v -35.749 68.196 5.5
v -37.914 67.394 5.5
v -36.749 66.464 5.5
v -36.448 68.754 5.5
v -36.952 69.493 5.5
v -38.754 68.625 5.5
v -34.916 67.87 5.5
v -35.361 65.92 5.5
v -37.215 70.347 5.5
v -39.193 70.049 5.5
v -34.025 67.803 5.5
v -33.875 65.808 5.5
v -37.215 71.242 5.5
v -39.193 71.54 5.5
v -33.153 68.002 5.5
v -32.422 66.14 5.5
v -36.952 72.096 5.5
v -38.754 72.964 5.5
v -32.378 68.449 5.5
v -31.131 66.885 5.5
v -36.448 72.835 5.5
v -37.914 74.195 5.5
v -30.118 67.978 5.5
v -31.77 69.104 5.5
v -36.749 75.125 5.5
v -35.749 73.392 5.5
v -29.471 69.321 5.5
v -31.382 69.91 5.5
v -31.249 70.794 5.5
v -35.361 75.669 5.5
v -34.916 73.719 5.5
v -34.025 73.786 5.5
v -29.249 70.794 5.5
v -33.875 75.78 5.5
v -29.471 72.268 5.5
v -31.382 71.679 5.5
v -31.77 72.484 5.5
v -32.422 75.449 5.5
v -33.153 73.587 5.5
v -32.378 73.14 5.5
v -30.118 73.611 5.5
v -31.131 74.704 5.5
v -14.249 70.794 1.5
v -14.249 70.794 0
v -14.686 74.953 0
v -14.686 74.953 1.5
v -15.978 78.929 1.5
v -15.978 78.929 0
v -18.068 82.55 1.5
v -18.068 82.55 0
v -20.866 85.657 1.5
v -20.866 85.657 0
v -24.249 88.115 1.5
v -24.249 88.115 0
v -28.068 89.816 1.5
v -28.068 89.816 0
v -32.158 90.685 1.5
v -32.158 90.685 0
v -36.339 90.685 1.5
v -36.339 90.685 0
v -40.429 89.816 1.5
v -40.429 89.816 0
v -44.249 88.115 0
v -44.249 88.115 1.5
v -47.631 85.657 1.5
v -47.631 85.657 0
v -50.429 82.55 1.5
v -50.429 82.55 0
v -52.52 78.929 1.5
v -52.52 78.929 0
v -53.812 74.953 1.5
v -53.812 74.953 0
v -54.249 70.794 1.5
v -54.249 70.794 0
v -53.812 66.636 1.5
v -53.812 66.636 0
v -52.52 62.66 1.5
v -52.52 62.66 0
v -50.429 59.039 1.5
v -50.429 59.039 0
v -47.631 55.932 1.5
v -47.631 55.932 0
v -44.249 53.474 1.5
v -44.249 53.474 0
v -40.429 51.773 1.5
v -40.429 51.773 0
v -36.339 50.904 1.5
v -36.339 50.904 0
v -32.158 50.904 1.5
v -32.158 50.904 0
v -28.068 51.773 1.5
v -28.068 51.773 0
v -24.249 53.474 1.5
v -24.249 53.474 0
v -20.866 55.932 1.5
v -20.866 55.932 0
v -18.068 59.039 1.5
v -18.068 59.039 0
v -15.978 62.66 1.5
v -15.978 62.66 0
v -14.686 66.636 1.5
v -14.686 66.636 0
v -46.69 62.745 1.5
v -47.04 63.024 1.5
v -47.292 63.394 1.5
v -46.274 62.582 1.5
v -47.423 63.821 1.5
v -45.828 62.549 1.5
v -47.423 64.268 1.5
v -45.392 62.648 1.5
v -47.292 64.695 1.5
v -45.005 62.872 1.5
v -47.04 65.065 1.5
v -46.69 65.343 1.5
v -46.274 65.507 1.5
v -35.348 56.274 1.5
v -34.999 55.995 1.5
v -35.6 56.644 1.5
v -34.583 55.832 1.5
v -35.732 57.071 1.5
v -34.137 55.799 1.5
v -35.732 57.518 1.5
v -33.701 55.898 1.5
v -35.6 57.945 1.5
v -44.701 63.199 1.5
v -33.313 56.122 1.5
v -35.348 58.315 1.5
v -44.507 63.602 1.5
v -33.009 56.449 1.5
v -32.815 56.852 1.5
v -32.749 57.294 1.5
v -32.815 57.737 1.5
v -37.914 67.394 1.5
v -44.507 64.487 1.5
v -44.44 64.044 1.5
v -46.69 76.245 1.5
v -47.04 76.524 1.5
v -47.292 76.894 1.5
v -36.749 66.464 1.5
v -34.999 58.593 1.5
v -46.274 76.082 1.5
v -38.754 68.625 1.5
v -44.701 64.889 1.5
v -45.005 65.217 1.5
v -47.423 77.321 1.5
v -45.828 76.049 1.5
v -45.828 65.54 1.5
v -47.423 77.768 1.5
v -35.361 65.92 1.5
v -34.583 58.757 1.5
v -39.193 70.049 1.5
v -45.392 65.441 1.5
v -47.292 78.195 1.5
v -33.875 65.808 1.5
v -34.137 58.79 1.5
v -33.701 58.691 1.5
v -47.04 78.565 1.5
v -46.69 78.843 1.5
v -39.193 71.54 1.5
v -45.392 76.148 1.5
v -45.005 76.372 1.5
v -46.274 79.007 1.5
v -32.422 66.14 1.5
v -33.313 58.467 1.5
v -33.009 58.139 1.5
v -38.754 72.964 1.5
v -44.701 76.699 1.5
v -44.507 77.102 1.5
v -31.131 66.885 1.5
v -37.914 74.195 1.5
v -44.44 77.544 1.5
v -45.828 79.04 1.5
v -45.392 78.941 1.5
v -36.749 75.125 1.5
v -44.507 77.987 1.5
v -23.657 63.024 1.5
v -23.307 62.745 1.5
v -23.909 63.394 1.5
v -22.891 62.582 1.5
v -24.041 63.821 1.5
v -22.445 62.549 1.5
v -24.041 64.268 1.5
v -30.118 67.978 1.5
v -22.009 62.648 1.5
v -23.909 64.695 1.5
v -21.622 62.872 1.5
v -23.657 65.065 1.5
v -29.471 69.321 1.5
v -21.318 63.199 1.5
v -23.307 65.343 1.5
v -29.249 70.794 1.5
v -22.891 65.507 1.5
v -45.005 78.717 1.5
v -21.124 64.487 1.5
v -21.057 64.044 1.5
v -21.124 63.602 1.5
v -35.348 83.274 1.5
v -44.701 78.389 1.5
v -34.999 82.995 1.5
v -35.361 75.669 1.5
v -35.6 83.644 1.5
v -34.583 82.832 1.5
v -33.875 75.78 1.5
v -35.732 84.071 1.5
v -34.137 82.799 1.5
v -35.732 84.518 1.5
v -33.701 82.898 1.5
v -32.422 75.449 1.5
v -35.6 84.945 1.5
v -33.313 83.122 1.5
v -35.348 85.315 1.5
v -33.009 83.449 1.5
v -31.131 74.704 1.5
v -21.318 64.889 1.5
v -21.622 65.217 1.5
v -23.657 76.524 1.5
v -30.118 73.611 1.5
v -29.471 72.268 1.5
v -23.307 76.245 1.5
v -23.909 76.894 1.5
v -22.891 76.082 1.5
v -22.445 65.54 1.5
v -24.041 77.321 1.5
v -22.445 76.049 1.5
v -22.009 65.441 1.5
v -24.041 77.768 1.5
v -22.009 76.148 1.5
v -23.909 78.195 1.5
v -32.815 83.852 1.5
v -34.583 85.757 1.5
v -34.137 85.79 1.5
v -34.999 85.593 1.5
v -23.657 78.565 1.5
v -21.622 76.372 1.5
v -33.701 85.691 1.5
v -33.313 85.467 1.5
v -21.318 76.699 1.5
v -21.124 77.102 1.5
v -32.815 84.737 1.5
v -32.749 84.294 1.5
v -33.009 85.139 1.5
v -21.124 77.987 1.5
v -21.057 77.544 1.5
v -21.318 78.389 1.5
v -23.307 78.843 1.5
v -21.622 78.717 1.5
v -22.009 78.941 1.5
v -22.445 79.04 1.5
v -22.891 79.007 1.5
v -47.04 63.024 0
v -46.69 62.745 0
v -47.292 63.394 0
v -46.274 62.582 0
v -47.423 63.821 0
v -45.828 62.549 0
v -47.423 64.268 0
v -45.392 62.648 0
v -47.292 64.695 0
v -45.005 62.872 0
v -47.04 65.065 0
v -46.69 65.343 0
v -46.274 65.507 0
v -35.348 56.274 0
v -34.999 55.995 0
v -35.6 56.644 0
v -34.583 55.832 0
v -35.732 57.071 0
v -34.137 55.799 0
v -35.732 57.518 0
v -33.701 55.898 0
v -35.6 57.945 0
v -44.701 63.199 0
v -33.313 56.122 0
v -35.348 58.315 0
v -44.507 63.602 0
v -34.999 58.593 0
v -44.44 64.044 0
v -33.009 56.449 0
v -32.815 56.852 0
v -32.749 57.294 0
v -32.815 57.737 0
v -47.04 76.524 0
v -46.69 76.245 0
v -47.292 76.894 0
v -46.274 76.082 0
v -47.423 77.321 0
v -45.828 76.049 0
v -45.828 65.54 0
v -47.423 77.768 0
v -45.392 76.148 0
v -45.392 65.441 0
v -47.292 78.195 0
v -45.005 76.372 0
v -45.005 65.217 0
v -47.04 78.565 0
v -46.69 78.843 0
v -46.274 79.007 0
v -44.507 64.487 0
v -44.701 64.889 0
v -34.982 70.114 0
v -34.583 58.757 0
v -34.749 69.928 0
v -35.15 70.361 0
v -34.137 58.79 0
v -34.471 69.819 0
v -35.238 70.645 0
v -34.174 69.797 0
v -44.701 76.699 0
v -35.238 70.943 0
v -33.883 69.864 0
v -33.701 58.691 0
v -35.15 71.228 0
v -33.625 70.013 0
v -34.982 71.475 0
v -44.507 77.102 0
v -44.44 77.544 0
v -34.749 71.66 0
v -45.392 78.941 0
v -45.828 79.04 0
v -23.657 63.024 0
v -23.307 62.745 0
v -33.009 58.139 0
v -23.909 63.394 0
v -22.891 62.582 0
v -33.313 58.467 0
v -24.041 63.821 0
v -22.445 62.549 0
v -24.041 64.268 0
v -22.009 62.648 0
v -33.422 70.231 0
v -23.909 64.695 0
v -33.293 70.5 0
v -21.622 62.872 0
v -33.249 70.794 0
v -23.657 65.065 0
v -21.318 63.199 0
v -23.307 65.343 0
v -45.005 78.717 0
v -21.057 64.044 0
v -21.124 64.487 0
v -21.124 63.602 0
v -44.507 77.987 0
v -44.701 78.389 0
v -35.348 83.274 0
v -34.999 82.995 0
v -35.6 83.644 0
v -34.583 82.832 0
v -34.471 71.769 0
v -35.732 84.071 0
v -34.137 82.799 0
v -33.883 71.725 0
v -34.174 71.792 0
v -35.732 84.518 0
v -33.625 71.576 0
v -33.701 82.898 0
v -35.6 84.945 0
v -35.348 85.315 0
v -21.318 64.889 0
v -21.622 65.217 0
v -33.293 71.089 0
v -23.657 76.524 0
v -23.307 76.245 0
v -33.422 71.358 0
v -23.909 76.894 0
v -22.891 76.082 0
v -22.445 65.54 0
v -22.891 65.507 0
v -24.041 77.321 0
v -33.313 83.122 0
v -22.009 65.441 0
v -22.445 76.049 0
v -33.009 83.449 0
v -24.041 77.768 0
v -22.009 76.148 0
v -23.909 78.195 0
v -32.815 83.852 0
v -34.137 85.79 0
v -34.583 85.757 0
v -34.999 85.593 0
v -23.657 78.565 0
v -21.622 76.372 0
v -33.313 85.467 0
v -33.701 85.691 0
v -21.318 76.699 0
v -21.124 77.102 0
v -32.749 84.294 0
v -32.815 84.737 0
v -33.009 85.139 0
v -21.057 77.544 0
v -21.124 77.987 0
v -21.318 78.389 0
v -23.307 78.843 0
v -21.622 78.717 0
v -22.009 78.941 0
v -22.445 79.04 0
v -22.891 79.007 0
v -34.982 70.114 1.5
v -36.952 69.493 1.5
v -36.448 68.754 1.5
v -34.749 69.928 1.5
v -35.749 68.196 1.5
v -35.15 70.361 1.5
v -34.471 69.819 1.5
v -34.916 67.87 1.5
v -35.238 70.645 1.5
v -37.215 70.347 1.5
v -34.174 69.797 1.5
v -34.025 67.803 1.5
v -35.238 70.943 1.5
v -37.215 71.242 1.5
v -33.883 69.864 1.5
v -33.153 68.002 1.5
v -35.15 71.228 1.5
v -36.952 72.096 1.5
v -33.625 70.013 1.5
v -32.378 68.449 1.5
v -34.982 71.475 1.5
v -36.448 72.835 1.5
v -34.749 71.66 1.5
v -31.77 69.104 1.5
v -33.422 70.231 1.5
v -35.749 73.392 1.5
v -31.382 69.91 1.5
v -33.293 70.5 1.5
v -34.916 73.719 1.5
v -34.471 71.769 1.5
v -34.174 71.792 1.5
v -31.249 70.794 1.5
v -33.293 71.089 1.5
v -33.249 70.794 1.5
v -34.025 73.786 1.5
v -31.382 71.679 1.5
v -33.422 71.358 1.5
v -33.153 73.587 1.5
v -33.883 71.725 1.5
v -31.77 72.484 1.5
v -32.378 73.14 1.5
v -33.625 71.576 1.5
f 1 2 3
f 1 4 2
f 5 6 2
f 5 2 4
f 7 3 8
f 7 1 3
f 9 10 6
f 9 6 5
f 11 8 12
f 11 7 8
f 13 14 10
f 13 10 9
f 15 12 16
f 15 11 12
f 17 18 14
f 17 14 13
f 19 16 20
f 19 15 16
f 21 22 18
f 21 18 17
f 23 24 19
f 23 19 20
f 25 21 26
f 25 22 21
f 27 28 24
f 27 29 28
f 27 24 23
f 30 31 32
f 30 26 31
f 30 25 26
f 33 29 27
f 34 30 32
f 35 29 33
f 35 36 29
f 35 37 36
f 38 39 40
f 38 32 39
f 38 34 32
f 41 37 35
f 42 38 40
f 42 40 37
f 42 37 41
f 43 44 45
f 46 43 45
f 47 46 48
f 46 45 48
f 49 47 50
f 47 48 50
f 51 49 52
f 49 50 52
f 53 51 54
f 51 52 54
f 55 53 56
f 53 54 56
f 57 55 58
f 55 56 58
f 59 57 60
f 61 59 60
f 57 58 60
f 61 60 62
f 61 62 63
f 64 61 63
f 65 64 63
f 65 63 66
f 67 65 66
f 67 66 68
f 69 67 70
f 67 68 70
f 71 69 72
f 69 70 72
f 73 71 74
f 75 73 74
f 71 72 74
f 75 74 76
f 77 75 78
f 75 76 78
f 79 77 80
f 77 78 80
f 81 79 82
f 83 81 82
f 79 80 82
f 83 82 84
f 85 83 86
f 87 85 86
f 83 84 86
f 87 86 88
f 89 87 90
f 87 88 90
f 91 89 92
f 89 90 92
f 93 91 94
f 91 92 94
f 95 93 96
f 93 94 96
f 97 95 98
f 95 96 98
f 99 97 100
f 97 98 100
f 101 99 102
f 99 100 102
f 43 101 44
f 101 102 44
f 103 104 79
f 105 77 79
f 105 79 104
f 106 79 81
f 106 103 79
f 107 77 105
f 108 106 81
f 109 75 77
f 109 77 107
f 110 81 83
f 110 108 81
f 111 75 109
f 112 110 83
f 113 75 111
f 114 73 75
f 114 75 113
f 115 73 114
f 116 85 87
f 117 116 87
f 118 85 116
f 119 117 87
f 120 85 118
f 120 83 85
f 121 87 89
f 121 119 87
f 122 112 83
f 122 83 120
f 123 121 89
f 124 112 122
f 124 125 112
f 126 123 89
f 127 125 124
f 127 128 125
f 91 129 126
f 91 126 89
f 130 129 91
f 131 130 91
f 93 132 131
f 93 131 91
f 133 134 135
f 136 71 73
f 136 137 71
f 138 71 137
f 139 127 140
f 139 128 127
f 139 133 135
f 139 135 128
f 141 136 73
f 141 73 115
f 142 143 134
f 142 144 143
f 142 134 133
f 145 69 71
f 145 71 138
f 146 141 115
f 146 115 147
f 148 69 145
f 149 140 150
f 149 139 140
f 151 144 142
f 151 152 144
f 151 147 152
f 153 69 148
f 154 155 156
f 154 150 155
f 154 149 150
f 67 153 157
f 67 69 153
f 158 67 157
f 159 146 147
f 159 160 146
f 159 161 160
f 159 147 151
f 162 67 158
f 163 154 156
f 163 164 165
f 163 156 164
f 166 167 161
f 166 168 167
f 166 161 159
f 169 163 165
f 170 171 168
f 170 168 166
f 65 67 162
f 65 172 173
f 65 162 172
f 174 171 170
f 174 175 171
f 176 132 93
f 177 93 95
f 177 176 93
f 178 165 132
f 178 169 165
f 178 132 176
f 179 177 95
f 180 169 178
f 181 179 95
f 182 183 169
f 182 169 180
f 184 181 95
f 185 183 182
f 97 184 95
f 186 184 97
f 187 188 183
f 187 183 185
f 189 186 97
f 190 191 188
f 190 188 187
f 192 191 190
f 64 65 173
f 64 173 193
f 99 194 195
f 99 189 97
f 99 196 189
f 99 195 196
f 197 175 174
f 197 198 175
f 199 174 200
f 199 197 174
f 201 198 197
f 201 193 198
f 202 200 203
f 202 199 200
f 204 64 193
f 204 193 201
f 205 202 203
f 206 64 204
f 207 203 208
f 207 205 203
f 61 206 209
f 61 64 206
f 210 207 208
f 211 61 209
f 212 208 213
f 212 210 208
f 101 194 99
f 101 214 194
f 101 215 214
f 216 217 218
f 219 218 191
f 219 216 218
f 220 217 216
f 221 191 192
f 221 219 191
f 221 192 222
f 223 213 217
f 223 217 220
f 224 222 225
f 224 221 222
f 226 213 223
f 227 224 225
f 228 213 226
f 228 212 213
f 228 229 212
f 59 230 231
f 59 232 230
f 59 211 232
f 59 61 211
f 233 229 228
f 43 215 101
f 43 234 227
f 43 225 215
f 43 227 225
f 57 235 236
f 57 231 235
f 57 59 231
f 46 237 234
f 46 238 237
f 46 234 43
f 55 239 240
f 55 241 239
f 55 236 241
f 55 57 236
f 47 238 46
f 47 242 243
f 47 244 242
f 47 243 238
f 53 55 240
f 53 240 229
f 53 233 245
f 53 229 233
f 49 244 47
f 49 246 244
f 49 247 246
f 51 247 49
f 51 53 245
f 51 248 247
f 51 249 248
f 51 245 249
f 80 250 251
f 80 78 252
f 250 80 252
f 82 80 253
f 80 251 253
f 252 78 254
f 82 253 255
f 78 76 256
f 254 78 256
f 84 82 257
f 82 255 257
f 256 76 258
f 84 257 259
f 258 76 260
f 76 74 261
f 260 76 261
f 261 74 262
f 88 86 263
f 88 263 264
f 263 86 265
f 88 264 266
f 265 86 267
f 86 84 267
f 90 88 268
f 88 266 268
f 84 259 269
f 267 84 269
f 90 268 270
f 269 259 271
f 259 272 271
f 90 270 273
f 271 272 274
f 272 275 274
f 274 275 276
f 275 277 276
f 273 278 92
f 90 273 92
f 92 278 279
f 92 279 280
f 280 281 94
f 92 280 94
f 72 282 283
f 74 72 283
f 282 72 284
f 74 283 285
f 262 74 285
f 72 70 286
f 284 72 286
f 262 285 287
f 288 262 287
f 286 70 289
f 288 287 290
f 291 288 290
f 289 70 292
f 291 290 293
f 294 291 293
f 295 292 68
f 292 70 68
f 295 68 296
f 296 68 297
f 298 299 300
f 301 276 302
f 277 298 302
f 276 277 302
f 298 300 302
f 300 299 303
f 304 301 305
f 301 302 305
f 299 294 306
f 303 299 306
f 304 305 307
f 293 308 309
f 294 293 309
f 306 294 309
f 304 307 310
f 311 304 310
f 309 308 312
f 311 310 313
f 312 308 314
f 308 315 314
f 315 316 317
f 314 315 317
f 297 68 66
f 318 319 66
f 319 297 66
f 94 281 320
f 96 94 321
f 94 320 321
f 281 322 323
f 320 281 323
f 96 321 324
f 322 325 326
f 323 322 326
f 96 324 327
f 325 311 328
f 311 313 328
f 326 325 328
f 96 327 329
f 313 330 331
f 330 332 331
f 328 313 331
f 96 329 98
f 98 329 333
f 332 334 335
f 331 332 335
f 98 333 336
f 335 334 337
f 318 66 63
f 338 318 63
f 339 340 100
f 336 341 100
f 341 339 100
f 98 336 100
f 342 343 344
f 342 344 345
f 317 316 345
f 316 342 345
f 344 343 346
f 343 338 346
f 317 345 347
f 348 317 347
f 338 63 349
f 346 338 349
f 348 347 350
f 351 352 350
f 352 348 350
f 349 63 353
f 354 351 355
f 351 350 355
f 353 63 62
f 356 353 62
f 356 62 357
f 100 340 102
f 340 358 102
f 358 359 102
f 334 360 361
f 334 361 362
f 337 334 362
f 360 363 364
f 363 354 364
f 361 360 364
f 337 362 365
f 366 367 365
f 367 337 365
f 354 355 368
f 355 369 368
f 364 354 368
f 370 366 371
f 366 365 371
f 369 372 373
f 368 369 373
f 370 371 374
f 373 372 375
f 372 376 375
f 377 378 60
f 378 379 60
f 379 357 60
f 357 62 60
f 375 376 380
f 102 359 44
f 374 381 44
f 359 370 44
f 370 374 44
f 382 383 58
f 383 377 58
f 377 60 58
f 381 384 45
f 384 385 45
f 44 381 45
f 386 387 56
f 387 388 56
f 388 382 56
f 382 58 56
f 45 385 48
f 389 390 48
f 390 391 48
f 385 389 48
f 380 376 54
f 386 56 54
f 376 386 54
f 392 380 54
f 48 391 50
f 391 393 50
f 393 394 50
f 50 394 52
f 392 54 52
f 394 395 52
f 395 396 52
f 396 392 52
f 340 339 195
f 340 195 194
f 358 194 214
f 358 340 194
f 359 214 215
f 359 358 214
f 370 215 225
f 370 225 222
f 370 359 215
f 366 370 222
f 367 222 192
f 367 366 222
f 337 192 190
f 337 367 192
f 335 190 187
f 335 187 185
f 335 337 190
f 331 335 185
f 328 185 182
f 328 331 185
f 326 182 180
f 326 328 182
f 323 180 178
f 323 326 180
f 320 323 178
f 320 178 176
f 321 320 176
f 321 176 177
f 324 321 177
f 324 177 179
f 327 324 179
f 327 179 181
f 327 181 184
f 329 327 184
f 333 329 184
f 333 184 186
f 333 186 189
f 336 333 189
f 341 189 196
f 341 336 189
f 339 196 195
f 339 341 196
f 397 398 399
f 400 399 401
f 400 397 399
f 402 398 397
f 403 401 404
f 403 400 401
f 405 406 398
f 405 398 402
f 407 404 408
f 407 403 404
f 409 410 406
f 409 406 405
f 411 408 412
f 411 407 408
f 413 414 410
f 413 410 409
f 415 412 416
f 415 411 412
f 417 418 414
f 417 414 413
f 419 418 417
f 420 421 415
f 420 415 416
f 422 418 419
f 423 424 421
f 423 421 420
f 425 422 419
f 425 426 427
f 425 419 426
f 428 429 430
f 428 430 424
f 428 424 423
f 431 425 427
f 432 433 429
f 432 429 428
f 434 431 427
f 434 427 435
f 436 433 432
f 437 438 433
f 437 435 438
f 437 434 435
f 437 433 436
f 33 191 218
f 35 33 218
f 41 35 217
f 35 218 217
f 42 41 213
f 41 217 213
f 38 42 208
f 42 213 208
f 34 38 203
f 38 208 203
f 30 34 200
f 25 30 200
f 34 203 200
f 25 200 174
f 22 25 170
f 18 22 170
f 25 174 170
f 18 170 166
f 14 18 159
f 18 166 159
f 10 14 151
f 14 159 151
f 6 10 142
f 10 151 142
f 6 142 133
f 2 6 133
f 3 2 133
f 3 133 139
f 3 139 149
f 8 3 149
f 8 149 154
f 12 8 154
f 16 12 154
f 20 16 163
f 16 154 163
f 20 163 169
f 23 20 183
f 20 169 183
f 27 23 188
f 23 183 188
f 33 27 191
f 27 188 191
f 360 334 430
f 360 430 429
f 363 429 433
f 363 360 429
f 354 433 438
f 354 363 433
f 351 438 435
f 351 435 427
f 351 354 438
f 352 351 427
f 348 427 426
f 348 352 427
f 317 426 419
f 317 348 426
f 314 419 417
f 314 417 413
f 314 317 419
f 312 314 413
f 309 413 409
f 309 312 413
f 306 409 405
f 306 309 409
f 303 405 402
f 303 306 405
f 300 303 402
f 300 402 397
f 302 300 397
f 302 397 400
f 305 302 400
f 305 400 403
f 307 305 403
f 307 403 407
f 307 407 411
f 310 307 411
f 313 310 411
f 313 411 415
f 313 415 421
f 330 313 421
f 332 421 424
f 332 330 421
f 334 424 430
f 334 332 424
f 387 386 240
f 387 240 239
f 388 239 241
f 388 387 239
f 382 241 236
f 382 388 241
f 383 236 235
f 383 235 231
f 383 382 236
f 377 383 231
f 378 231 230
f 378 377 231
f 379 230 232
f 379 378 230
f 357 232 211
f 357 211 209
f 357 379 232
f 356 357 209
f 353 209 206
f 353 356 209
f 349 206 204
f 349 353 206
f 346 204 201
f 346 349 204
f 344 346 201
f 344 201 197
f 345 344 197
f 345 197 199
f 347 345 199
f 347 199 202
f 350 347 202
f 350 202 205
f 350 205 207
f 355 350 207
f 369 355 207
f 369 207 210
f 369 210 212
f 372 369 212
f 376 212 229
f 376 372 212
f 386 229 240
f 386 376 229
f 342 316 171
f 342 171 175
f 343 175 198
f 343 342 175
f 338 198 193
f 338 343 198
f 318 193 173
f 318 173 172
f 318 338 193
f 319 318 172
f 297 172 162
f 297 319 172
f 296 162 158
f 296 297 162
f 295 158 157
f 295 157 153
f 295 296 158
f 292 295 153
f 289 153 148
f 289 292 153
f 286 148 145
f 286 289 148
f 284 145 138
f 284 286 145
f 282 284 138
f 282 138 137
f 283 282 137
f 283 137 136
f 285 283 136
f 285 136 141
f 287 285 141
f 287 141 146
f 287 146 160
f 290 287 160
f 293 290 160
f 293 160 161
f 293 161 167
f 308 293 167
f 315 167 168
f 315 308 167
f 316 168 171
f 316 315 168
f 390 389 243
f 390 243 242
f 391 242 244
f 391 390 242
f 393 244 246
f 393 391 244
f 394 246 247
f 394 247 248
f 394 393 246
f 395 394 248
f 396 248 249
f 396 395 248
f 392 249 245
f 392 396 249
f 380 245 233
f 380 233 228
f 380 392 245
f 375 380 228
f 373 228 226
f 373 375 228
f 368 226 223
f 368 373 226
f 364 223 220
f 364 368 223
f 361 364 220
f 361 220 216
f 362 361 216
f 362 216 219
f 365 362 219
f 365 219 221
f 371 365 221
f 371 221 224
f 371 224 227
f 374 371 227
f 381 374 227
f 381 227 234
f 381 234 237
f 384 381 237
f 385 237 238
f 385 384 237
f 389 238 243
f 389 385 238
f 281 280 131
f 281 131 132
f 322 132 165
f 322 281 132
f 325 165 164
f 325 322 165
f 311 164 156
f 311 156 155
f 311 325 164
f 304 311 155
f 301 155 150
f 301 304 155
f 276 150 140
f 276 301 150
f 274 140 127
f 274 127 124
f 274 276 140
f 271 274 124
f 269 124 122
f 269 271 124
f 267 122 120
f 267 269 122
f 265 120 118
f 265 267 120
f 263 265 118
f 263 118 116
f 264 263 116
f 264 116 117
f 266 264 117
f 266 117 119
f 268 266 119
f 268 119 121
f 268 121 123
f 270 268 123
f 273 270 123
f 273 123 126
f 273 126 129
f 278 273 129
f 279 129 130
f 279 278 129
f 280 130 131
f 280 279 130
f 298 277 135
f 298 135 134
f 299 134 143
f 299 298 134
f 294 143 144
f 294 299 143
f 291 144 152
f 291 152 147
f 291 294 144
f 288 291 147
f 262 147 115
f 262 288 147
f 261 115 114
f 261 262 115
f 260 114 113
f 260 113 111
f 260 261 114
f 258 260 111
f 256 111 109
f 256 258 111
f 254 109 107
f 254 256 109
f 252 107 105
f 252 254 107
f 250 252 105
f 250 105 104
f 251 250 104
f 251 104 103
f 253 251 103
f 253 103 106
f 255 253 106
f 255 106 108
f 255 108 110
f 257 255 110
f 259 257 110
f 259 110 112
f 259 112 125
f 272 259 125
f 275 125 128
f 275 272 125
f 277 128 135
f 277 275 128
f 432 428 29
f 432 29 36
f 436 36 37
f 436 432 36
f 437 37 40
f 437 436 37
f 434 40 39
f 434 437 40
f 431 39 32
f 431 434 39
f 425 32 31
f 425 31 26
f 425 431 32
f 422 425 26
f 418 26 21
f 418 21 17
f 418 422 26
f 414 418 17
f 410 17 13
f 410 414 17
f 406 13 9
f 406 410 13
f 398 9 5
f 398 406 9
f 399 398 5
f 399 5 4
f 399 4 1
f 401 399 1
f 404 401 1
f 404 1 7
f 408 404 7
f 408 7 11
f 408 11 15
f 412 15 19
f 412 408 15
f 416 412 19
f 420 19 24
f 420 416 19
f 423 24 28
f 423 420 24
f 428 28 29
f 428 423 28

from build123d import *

# Parameters (mm, degrees)
SKETCH1_R           = 20
SKETCH1_R_2         = 1.5
SKETCH1_R_3         = 1
BOSS_EXTRUDE1_DEPTH = 1.5
SKETCH2_R           = 5
SKETCH2_R_2         = 3
BOSS_EXTRUDE2_DEPTH = 4


with BuildPart() as part:
    # Sketch1 → Boss-Extrude1 (new body)
    with BuildSketch(Plane.XY):
        with Locations((-34.248726775, 70.794412983)):
            Circle(SKETCH1_R)
        with Locations((-45.940069726, 77.544412983)):
            Circle(SKETCH1_R_2, mode=Mode.SUBTRACT)
        with Locations((-34.248726775, 84.294412983)):
            Circle(SKETCH1_R_2, mode=Mode.SUBTRACT)
        with Locations((-22.557383823, 77.544412983)):
            Circle(SKETCH1_R_2, mode=Mode.SUBTRACT)
        with Locations((-22.557383823, 64.044412983)):
            Circle(SKETCH1_R_2, mode=Mode.SUBTRACT)
        with Locations((-34.248726775, 57.294412983)):
            Circle(SKETCH1_R_2, mode=Mode.SUBTRACT)
        with Locations((-45.940069726, 64.044412983)):
            Circle(SKETCH1_R_2, mode=Mode.SUBTRACT)
        with Locations((-34.248726775, 70.794412983)):
            Circle(SKETCH1_R_3, mode=Mode.SUBTRACT)
    extrude(amount=BOSS_EXTRUDE1_DEPTH)

    # Sketch2 → Boss-Extrude2 (add)
    with BuildSketch(Plane.XY.offset(1.5)):
        with Locations((-34.248726775, 70.794412983)):
            Circle(SKETCH2_R)
        with Locations((-34.248726775, 70.794412983)):
            Circle(SKETCH2_R_2, mode=Mode.SUBTRACT)
    extrude(amount=BOSS_EXTRUDE2_DEPTH)


solid = part.part
